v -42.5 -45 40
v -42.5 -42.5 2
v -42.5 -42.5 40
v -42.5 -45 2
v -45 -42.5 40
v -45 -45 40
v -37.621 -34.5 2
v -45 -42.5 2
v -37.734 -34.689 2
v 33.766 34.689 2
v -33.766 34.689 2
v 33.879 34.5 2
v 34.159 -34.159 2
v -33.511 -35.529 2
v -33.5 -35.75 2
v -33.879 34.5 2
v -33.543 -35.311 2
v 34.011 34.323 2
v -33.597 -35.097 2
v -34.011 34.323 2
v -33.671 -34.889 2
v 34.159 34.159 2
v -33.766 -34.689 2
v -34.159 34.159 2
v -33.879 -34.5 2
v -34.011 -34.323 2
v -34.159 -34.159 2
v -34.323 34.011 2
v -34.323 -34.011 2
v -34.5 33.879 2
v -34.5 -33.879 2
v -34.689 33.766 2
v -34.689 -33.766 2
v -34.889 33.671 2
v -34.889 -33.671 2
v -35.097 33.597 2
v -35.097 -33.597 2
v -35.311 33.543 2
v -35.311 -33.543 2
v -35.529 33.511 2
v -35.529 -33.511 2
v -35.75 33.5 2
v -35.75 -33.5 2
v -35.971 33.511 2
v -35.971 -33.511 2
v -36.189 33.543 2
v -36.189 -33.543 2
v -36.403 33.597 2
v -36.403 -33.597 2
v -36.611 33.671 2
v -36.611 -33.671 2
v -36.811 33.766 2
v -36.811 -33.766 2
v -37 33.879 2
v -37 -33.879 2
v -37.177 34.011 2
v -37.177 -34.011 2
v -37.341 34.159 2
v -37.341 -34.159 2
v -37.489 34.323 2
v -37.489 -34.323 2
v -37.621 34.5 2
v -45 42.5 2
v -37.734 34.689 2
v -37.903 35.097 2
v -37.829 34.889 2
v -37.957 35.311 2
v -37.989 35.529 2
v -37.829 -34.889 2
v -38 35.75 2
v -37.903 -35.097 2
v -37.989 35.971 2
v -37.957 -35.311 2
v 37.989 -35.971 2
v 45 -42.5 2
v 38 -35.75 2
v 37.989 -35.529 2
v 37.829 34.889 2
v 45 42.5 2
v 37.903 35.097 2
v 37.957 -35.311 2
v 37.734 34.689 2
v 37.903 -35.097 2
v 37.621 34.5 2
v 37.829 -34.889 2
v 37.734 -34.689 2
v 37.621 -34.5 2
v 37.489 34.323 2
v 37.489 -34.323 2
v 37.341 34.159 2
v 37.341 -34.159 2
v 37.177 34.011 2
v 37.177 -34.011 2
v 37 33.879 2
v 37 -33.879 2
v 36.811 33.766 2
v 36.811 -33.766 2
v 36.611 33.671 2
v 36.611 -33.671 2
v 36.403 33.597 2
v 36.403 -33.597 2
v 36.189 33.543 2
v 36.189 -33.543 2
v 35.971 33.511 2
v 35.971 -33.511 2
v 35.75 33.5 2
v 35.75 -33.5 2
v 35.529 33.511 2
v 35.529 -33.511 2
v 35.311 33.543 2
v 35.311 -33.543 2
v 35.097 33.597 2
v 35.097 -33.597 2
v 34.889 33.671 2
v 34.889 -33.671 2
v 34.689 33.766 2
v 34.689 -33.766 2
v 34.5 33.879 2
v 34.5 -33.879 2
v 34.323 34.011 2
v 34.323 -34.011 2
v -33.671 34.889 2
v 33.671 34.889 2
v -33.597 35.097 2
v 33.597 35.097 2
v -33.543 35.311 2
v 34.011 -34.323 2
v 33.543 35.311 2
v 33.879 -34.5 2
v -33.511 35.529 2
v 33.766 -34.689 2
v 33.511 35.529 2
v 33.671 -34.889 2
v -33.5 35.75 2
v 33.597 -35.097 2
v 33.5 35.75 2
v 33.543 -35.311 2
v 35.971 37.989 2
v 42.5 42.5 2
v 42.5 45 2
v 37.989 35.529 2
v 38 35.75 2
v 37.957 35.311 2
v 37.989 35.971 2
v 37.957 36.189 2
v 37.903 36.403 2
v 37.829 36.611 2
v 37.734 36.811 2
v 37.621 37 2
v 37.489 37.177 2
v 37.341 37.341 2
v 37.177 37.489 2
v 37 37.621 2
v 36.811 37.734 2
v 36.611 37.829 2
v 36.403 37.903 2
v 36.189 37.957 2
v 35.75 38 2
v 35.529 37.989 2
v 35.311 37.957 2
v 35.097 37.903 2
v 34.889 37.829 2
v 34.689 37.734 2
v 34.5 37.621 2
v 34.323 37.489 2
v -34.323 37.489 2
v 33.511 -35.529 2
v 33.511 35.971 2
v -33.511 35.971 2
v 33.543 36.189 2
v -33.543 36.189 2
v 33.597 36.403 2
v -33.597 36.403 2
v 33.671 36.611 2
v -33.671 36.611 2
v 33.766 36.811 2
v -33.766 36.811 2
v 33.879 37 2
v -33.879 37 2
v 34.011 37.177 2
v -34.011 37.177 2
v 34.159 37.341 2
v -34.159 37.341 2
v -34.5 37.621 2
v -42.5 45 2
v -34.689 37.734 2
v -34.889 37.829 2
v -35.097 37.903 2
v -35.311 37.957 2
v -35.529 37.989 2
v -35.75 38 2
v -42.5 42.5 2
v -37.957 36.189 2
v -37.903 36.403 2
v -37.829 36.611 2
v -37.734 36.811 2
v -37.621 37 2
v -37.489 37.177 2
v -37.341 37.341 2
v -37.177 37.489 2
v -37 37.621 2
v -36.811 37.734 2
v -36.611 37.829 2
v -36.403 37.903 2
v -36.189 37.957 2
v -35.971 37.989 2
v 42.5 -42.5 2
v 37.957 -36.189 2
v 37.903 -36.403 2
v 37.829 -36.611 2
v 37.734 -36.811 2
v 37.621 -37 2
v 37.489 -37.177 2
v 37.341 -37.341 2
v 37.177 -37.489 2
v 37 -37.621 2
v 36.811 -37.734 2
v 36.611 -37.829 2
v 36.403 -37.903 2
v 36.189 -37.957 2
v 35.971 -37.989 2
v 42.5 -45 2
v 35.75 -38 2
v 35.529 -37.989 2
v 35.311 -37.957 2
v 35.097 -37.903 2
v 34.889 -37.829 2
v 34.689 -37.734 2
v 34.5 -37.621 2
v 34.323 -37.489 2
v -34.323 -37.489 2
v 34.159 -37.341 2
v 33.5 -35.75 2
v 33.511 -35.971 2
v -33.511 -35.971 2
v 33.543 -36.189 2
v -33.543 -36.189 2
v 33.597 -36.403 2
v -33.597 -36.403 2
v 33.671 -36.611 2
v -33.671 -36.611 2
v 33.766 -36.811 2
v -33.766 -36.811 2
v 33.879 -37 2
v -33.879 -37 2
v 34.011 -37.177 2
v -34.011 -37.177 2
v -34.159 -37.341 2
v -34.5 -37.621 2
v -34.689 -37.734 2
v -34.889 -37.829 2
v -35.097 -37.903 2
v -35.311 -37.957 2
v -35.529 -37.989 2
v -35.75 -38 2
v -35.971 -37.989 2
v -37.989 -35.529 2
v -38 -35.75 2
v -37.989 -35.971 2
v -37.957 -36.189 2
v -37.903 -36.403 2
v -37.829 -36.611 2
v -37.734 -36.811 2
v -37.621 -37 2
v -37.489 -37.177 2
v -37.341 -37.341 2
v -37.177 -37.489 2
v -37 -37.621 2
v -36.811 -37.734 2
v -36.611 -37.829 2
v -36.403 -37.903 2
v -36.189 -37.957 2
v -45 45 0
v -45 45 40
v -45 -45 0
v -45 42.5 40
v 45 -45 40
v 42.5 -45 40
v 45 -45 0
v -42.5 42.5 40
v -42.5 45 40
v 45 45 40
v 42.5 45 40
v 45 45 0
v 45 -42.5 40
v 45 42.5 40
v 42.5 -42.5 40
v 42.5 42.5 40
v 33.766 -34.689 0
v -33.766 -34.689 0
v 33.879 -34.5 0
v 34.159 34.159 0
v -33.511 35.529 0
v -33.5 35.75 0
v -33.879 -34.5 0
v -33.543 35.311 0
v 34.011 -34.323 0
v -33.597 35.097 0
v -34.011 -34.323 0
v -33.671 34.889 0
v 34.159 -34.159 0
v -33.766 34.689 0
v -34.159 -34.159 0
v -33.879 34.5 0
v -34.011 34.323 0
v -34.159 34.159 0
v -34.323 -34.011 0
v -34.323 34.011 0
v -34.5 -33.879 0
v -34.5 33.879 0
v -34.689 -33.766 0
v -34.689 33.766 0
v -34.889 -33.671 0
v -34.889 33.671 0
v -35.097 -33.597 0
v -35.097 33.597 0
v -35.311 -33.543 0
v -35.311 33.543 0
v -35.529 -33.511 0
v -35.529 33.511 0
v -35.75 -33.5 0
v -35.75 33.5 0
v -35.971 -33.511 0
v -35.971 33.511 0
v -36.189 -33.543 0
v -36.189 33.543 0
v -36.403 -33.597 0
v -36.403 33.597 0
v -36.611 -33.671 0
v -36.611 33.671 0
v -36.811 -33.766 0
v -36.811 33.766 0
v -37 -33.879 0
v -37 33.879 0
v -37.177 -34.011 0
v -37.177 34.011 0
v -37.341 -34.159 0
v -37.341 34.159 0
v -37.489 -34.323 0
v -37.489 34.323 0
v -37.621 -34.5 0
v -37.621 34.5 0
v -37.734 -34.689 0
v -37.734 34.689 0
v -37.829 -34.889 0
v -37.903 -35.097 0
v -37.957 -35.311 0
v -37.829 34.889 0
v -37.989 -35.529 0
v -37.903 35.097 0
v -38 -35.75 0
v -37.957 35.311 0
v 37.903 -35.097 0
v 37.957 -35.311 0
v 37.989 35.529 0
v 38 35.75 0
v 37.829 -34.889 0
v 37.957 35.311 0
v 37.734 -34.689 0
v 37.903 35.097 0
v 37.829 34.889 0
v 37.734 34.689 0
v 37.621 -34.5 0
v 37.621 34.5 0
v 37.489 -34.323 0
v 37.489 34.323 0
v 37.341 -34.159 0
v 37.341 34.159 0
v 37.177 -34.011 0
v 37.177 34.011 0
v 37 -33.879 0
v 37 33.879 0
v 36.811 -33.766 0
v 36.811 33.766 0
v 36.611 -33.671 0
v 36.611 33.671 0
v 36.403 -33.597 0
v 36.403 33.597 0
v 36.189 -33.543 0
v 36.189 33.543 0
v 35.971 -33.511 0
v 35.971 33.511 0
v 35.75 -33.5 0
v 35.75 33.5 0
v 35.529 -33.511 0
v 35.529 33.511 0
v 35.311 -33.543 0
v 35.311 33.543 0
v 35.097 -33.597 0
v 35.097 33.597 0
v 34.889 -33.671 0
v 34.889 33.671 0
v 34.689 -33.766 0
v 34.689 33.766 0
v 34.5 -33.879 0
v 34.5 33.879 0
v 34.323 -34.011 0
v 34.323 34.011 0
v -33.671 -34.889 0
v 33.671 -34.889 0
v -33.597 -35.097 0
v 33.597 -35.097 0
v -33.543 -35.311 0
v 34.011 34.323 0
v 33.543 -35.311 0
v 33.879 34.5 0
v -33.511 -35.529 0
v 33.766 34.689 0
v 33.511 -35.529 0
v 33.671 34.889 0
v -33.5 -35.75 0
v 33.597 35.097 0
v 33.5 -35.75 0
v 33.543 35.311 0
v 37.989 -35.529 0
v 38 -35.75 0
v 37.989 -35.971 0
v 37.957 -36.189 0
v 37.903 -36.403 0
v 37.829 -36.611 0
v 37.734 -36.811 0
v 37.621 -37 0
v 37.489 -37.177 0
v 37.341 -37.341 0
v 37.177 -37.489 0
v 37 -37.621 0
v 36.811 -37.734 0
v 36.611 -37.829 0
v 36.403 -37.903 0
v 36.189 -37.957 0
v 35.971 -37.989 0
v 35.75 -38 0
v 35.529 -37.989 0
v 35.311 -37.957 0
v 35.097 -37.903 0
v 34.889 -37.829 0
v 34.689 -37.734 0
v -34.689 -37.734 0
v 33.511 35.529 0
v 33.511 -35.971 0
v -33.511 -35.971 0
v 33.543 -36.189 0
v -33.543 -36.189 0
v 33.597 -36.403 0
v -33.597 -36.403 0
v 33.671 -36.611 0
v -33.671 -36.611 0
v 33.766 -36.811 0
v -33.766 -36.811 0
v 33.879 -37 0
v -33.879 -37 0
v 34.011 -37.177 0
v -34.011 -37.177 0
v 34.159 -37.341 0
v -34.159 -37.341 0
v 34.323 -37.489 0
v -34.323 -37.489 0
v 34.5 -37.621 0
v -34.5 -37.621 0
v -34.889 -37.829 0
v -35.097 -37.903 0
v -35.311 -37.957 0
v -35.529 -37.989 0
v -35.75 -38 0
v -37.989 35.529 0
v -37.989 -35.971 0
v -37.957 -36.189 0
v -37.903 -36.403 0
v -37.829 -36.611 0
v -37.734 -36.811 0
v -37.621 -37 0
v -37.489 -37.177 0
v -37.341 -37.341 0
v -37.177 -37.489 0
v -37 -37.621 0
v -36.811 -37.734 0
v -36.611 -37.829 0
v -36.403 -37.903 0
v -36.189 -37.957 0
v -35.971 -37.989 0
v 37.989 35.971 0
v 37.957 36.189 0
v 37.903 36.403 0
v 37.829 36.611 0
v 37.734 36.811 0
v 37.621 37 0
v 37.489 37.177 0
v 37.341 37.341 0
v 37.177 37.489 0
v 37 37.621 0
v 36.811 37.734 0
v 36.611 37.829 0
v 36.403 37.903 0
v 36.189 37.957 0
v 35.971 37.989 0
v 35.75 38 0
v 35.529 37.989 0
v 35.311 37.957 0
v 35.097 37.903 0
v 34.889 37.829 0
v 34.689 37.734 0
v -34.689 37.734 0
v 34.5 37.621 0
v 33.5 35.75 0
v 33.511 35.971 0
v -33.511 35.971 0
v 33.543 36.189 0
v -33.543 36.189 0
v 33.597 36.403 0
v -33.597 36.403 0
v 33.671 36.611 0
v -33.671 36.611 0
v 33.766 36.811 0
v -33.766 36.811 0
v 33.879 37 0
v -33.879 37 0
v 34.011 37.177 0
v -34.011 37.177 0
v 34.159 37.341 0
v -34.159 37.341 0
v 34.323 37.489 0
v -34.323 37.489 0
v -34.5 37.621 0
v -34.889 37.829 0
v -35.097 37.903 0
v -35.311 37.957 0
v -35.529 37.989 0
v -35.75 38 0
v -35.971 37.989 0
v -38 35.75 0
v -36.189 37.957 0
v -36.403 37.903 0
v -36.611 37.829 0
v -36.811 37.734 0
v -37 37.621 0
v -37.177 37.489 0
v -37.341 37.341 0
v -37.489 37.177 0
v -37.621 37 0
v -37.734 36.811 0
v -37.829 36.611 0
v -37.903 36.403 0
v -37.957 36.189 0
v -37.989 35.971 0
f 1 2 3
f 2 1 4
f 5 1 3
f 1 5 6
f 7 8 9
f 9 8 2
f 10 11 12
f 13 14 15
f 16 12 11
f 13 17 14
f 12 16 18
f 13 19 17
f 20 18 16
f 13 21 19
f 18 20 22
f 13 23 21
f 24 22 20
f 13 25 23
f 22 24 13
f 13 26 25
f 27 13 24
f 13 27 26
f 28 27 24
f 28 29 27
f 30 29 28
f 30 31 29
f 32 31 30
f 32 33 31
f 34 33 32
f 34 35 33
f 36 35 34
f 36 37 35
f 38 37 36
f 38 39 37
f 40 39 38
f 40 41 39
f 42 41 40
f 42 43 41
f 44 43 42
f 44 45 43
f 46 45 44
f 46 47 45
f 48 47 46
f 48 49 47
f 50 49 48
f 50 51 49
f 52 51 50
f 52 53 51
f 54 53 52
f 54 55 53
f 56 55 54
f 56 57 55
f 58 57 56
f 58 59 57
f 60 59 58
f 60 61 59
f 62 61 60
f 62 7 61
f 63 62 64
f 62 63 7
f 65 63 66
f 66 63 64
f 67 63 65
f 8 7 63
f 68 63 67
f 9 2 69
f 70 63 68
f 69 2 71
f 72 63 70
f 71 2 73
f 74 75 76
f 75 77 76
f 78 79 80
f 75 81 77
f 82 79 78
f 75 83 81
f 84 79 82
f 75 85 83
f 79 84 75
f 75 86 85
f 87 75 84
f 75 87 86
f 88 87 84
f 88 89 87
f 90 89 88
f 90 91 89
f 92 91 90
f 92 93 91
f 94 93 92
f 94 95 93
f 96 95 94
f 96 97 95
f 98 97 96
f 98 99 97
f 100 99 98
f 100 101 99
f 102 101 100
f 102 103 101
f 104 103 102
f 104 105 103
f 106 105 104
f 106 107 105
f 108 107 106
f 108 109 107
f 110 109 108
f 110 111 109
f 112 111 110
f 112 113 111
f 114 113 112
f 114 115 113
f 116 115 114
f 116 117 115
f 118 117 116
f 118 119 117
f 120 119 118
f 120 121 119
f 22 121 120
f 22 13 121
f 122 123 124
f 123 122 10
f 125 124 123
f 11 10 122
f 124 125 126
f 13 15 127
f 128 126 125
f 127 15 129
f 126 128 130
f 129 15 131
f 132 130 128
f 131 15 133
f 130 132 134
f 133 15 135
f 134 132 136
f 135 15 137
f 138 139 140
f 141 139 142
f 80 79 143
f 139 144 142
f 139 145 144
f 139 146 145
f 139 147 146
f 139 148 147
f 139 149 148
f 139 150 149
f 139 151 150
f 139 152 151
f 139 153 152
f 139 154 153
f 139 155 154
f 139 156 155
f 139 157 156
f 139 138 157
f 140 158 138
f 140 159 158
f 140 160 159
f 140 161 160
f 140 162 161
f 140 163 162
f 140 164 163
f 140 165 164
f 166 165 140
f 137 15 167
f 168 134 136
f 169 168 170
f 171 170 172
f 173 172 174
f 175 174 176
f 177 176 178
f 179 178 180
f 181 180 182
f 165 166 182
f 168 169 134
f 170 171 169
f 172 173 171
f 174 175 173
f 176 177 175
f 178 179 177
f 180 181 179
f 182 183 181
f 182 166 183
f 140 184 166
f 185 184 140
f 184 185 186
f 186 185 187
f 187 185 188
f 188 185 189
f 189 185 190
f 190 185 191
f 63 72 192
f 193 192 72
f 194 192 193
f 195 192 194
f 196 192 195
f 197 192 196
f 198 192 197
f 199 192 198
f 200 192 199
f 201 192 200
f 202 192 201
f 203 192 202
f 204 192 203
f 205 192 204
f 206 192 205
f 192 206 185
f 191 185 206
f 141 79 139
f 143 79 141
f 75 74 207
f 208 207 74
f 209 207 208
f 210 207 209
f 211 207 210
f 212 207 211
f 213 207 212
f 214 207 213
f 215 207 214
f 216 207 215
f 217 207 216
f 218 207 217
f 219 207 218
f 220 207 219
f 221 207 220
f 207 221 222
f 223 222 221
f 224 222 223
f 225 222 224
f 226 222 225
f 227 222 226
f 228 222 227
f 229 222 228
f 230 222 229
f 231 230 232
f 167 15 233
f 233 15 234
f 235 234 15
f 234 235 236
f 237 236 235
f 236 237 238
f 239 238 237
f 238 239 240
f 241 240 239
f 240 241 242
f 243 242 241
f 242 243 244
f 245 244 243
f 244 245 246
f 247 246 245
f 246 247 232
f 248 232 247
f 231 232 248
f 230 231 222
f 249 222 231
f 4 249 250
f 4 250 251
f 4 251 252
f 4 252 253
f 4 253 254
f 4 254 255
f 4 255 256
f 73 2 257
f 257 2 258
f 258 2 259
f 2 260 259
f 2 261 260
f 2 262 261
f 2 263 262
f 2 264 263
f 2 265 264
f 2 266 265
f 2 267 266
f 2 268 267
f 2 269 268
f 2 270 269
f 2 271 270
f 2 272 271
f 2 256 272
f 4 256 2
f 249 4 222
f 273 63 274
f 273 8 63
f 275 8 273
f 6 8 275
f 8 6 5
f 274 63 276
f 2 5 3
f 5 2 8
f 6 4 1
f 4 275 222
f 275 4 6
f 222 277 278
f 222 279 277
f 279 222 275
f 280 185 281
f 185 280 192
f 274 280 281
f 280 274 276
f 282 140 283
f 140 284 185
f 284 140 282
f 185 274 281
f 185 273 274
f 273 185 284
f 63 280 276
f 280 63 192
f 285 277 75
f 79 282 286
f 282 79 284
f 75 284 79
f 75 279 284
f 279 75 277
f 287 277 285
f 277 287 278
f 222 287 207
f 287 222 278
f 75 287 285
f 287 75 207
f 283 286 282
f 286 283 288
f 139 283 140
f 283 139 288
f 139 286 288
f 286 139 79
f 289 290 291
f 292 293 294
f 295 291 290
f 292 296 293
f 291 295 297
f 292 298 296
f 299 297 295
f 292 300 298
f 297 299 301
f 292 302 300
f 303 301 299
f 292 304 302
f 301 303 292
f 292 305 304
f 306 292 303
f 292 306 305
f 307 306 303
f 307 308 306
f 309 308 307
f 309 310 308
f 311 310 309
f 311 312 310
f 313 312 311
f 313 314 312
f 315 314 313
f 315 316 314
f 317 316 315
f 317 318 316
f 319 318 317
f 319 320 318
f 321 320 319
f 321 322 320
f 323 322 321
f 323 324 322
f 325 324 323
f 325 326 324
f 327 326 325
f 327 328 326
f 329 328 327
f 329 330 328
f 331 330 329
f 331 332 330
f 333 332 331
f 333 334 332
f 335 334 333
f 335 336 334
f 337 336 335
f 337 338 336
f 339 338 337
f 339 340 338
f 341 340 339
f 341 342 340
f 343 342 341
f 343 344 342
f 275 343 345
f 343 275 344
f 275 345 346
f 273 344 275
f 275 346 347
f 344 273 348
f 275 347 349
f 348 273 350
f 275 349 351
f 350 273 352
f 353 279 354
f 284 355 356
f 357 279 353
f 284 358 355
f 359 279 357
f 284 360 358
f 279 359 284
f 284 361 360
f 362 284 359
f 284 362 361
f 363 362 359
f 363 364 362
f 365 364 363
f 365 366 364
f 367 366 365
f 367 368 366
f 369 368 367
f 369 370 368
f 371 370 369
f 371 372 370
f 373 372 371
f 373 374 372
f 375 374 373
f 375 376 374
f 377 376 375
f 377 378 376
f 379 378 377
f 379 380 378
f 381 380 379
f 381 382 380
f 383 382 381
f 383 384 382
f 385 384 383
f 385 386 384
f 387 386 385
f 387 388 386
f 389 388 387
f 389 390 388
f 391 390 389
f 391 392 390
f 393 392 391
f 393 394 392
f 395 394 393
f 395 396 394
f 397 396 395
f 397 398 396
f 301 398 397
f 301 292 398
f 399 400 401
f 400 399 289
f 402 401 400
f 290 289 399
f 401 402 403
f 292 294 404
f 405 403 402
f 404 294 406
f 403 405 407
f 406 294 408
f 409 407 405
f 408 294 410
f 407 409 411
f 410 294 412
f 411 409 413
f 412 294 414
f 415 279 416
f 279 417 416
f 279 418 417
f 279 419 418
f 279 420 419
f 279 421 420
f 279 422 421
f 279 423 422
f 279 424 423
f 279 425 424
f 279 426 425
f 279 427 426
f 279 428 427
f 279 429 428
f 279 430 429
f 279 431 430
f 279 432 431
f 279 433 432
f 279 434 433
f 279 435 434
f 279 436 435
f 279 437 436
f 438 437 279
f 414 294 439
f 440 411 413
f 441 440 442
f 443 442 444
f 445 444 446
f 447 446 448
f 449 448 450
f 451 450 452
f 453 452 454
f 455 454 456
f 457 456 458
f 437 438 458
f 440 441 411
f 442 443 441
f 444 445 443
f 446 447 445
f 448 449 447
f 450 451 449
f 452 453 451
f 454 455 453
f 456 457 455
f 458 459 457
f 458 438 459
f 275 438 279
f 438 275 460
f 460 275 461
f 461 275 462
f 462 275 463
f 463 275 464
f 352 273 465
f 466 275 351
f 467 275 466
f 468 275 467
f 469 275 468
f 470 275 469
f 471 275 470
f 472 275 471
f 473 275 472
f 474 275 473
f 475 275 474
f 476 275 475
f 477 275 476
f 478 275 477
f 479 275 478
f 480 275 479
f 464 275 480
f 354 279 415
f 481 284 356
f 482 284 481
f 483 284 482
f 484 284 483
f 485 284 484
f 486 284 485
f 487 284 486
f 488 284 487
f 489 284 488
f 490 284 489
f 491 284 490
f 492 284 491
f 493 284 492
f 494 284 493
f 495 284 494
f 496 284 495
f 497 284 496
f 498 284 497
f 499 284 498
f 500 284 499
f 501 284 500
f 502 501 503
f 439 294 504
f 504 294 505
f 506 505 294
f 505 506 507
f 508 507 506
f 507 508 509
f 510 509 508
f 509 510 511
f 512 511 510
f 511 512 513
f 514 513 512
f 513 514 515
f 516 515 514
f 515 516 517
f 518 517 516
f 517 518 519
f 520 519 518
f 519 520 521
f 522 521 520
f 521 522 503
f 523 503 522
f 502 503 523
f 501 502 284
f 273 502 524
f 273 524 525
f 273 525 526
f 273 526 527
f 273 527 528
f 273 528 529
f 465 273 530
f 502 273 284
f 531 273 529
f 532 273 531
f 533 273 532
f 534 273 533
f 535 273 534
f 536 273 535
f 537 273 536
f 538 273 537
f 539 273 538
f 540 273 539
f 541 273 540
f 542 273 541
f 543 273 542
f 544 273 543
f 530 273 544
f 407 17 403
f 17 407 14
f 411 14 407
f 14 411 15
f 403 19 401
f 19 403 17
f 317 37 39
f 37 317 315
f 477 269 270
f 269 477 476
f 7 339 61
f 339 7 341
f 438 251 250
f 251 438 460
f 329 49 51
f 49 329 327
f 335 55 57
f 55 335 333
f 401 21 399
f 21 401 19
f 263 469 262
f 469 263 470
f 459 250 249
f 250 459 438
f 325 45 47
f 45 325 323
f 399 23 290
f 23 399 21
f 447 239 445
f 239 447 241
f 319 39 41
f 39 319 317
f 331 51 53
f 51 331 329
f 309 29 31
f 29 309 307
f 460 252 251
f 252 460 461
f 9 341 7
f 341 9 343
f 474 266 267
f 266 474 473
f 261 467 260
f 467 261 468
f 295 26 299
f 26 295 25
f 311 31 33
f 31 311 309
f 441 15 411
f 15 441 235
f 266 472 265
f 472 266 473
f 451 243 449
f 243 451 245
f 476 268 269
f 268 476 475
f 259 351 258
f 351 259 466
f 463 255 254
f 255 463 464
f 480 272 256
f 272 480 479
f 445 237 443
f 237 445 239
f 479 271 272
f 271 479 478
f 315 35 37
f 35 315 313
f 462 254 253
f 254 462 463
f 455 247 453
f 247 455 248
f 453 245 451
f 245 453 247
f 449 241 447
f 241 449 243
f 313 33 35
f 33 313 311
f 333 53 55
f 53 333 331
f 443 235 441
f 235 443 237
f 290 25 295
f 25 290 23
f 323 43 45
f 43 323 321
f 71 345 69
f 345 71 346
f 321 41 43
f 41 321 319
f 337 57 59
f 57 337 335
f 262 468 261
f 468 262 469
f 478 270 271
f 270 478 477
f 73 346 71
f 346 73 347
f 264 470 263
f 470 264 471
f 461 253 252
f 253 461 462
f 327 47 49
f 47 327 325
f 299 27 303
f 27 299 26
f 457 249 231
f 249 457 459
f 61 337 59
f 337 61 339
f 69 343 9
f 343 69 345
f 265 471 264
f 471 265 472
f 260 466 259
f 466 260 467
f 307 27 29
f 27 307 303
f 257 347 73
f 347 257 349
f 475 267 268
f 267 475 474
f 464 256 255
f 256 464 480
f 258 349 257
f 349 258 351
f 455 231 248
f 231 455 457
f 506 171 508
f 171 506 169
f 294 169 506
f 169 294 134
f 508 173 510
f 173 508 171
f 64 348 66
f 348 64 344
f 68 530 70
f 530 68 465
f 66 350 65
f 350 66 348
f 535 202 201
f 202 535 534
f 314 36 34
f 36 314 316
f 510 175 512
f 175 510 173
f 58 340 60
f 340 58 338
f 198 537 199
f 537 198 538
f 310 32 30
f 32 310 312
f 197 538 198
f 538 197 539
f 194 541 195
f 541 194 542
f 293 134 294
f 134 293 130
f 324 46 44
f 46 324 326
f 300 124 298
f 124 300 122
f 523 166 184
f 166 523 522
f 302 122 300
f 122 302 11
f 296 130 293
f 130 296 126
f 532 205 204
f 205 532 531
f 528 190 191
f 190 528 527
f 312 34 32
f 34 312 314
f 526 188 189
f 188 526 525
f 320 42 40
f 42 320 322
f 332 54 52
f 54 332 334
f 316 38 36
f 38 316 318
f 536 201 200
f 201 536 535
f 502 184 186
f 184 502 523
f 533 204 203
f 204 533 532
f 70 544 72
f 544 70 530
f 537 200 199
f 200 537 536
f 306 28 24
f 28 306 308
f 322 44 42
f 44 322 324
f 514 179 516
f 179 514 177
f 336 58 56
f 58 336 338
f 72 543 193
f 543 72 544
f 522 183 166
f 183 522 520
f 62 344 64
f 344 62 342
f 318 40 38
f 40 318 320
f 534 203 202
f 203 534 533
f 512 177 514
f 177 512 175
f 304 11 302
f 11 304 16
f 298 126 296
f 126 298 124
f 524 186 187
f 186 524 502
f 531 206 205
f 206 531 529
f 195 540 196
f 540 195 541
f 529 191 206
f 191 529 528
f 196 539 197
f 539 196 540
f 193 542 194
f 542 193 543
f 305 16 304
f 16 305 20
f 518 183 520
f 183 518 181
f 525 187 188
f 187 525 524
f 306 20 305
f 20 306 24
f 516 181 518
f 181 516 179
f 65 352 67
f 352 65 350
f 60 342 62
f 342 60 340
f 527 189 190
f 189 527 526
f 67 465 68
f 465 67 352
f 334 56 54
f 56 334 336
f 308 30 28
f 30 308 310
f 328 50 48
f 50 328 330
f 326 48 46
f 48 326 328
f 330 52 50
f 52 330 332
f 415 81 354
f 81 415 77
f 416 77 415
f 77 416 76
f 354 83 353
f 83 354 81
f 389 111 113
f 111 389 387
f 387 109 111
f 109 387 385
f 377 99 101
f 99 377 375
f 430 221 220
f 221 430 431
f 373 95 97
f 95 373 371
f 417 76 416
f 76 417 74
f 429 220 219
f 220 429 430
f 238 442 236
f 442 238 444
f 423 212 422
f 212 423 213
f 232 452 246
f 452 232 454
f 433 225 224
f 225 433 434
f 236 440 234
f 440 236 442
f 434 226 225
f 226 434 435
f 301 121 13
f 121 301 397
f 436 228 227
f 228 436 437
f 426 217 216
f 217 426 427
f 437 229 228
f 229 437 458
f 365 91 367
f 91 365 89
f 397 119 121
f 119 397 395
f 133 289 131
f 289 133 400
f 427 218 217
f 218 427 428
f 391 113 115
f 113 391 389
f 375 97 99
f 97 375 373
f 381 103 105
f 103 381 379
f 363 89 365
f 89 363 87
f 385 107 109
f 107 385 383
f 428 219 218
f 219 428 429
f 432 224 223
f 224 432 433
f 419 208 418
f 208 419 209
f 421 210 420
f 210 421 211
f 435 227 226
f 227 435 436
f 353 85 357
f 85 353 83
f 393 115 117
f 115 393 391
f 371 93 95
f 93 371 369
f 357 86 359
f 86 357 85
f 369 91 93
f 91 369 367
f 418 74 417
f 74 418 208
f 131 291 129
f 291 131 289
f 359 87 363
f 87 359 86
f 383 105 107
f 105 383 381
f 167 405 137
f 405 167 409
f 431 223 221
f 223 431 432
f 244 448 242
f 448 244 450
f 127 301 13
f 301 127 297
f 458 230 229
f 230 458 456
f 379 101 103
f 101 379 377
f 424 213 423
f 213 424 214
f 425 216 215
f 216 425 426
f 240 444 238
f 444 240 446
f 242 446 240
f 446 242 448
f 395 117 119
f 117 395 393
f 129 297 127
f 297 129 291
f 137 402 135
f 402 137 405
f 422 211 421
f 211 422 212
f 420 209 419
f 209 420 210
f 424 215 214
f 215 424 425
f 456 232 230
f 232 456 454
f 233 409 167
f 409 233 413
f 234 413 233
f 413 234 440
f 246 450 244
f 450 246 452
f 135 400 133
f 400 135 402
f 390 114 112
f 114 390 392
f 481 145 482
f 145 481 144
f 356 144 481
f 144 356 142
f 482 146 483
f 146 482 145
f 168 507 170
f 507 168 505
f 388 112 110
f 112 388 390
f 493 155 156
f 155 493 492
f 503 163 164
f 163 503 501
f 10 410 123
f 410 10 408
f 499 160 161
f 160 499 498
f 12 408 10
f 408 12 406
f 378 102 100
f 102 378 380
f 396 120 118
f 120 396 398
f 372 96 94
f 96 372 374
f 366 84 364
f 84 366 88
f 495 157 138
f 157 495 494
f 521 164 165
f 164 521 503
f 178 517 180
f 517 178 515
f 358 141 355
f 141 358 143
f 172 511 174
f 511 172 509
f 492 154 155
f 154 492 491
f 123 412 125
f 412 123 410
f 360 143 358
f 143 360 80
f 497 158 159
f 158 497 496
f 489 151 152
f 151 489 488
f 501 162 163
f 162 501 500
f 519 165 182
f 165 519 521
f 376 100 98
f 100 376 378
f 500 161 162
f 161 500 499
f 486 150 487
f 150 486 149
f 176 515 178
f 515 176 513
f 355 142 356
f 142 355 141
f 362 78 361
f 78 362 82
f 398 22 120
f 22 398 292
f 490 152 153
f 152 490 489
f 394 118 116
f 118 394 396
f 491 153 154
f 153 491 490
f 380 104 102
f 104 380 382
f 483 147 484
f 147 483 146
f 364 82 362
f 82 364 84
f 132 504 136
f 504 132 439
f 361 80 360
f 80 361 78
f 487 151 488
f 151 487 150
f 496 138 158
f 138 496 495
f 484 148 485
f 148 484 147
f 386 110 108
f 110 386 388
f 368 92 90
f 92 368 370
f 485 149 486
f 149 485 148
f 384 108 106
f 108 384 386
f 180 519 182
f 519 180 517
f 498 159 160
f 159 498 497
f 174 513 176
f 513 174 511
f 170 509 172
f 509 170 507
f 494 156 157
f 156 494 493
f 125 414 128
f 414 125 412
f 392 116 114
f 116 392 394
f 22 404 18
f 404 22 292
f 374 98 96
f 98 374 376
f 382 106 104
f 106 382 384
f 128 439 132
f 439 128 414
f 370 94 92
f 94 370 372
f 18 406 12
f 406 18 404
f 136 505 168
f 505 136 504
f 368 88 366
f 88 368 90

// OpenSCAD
// Magnetic stirrer housing - open box covering an 80 mm PC case fan
// Print orientation: top plate on bed (z = 0), walls rise to z = 40

// ---------- Parameters ----------
top_t      = 2;     // top plate thickness
wall_t     = 2.5;   // wall thickness
box_h      = 40;    // wall height (open top at z = 40)
outer_w    = 90;    // outer size in X and Y
hole_d     = 4.5;   // M4 screw hole diameter
hole_pitch = 71.5;  // square pattern side for screw holes
notch_w    = 12;    // cable notch width
notch_bottom = 32;  // notch floor height (notch runs z = 32 to 40)
eps        = 0.5;   // cutter overshoot past faces

$fn = 64;

// ---------- Model ----------
difference() {
    union() {
        // Top plate
        translate([-outer_w/2, -outer_w/2, 0])
            cube([outer_w, outer_w, top_t]);

        // Four walls, open top
        for (sx = [-1, 1], sy = [-1, 1])
            translate([sx > 0 ? outer_w/2 - wall_t : -outer_w/2,
                       sy > 0 ? outer_w/2 - wall_t : -outer_w/2,
                       top_t])
                cube([wall_t, wall_t, box_h - top_t]);
    }

    // Screw holes through top plate
    for (x = [-hole_pitch/2, hole_pitch/2],
         y = [-hole_pitch/2, hole_pitch/2])
        translate([x, y, -eps])
            cylinder(d = hole_d, h = top_t + 2*eps);

    // Cable notch in one wall (centred along +Y wall)
    translate([outer_w/2 - wall_t, -notch_w/2, notch_bottom])
        cube([wall_t + eps, notch_w, box_h - notch_bottom + eps]);
}
